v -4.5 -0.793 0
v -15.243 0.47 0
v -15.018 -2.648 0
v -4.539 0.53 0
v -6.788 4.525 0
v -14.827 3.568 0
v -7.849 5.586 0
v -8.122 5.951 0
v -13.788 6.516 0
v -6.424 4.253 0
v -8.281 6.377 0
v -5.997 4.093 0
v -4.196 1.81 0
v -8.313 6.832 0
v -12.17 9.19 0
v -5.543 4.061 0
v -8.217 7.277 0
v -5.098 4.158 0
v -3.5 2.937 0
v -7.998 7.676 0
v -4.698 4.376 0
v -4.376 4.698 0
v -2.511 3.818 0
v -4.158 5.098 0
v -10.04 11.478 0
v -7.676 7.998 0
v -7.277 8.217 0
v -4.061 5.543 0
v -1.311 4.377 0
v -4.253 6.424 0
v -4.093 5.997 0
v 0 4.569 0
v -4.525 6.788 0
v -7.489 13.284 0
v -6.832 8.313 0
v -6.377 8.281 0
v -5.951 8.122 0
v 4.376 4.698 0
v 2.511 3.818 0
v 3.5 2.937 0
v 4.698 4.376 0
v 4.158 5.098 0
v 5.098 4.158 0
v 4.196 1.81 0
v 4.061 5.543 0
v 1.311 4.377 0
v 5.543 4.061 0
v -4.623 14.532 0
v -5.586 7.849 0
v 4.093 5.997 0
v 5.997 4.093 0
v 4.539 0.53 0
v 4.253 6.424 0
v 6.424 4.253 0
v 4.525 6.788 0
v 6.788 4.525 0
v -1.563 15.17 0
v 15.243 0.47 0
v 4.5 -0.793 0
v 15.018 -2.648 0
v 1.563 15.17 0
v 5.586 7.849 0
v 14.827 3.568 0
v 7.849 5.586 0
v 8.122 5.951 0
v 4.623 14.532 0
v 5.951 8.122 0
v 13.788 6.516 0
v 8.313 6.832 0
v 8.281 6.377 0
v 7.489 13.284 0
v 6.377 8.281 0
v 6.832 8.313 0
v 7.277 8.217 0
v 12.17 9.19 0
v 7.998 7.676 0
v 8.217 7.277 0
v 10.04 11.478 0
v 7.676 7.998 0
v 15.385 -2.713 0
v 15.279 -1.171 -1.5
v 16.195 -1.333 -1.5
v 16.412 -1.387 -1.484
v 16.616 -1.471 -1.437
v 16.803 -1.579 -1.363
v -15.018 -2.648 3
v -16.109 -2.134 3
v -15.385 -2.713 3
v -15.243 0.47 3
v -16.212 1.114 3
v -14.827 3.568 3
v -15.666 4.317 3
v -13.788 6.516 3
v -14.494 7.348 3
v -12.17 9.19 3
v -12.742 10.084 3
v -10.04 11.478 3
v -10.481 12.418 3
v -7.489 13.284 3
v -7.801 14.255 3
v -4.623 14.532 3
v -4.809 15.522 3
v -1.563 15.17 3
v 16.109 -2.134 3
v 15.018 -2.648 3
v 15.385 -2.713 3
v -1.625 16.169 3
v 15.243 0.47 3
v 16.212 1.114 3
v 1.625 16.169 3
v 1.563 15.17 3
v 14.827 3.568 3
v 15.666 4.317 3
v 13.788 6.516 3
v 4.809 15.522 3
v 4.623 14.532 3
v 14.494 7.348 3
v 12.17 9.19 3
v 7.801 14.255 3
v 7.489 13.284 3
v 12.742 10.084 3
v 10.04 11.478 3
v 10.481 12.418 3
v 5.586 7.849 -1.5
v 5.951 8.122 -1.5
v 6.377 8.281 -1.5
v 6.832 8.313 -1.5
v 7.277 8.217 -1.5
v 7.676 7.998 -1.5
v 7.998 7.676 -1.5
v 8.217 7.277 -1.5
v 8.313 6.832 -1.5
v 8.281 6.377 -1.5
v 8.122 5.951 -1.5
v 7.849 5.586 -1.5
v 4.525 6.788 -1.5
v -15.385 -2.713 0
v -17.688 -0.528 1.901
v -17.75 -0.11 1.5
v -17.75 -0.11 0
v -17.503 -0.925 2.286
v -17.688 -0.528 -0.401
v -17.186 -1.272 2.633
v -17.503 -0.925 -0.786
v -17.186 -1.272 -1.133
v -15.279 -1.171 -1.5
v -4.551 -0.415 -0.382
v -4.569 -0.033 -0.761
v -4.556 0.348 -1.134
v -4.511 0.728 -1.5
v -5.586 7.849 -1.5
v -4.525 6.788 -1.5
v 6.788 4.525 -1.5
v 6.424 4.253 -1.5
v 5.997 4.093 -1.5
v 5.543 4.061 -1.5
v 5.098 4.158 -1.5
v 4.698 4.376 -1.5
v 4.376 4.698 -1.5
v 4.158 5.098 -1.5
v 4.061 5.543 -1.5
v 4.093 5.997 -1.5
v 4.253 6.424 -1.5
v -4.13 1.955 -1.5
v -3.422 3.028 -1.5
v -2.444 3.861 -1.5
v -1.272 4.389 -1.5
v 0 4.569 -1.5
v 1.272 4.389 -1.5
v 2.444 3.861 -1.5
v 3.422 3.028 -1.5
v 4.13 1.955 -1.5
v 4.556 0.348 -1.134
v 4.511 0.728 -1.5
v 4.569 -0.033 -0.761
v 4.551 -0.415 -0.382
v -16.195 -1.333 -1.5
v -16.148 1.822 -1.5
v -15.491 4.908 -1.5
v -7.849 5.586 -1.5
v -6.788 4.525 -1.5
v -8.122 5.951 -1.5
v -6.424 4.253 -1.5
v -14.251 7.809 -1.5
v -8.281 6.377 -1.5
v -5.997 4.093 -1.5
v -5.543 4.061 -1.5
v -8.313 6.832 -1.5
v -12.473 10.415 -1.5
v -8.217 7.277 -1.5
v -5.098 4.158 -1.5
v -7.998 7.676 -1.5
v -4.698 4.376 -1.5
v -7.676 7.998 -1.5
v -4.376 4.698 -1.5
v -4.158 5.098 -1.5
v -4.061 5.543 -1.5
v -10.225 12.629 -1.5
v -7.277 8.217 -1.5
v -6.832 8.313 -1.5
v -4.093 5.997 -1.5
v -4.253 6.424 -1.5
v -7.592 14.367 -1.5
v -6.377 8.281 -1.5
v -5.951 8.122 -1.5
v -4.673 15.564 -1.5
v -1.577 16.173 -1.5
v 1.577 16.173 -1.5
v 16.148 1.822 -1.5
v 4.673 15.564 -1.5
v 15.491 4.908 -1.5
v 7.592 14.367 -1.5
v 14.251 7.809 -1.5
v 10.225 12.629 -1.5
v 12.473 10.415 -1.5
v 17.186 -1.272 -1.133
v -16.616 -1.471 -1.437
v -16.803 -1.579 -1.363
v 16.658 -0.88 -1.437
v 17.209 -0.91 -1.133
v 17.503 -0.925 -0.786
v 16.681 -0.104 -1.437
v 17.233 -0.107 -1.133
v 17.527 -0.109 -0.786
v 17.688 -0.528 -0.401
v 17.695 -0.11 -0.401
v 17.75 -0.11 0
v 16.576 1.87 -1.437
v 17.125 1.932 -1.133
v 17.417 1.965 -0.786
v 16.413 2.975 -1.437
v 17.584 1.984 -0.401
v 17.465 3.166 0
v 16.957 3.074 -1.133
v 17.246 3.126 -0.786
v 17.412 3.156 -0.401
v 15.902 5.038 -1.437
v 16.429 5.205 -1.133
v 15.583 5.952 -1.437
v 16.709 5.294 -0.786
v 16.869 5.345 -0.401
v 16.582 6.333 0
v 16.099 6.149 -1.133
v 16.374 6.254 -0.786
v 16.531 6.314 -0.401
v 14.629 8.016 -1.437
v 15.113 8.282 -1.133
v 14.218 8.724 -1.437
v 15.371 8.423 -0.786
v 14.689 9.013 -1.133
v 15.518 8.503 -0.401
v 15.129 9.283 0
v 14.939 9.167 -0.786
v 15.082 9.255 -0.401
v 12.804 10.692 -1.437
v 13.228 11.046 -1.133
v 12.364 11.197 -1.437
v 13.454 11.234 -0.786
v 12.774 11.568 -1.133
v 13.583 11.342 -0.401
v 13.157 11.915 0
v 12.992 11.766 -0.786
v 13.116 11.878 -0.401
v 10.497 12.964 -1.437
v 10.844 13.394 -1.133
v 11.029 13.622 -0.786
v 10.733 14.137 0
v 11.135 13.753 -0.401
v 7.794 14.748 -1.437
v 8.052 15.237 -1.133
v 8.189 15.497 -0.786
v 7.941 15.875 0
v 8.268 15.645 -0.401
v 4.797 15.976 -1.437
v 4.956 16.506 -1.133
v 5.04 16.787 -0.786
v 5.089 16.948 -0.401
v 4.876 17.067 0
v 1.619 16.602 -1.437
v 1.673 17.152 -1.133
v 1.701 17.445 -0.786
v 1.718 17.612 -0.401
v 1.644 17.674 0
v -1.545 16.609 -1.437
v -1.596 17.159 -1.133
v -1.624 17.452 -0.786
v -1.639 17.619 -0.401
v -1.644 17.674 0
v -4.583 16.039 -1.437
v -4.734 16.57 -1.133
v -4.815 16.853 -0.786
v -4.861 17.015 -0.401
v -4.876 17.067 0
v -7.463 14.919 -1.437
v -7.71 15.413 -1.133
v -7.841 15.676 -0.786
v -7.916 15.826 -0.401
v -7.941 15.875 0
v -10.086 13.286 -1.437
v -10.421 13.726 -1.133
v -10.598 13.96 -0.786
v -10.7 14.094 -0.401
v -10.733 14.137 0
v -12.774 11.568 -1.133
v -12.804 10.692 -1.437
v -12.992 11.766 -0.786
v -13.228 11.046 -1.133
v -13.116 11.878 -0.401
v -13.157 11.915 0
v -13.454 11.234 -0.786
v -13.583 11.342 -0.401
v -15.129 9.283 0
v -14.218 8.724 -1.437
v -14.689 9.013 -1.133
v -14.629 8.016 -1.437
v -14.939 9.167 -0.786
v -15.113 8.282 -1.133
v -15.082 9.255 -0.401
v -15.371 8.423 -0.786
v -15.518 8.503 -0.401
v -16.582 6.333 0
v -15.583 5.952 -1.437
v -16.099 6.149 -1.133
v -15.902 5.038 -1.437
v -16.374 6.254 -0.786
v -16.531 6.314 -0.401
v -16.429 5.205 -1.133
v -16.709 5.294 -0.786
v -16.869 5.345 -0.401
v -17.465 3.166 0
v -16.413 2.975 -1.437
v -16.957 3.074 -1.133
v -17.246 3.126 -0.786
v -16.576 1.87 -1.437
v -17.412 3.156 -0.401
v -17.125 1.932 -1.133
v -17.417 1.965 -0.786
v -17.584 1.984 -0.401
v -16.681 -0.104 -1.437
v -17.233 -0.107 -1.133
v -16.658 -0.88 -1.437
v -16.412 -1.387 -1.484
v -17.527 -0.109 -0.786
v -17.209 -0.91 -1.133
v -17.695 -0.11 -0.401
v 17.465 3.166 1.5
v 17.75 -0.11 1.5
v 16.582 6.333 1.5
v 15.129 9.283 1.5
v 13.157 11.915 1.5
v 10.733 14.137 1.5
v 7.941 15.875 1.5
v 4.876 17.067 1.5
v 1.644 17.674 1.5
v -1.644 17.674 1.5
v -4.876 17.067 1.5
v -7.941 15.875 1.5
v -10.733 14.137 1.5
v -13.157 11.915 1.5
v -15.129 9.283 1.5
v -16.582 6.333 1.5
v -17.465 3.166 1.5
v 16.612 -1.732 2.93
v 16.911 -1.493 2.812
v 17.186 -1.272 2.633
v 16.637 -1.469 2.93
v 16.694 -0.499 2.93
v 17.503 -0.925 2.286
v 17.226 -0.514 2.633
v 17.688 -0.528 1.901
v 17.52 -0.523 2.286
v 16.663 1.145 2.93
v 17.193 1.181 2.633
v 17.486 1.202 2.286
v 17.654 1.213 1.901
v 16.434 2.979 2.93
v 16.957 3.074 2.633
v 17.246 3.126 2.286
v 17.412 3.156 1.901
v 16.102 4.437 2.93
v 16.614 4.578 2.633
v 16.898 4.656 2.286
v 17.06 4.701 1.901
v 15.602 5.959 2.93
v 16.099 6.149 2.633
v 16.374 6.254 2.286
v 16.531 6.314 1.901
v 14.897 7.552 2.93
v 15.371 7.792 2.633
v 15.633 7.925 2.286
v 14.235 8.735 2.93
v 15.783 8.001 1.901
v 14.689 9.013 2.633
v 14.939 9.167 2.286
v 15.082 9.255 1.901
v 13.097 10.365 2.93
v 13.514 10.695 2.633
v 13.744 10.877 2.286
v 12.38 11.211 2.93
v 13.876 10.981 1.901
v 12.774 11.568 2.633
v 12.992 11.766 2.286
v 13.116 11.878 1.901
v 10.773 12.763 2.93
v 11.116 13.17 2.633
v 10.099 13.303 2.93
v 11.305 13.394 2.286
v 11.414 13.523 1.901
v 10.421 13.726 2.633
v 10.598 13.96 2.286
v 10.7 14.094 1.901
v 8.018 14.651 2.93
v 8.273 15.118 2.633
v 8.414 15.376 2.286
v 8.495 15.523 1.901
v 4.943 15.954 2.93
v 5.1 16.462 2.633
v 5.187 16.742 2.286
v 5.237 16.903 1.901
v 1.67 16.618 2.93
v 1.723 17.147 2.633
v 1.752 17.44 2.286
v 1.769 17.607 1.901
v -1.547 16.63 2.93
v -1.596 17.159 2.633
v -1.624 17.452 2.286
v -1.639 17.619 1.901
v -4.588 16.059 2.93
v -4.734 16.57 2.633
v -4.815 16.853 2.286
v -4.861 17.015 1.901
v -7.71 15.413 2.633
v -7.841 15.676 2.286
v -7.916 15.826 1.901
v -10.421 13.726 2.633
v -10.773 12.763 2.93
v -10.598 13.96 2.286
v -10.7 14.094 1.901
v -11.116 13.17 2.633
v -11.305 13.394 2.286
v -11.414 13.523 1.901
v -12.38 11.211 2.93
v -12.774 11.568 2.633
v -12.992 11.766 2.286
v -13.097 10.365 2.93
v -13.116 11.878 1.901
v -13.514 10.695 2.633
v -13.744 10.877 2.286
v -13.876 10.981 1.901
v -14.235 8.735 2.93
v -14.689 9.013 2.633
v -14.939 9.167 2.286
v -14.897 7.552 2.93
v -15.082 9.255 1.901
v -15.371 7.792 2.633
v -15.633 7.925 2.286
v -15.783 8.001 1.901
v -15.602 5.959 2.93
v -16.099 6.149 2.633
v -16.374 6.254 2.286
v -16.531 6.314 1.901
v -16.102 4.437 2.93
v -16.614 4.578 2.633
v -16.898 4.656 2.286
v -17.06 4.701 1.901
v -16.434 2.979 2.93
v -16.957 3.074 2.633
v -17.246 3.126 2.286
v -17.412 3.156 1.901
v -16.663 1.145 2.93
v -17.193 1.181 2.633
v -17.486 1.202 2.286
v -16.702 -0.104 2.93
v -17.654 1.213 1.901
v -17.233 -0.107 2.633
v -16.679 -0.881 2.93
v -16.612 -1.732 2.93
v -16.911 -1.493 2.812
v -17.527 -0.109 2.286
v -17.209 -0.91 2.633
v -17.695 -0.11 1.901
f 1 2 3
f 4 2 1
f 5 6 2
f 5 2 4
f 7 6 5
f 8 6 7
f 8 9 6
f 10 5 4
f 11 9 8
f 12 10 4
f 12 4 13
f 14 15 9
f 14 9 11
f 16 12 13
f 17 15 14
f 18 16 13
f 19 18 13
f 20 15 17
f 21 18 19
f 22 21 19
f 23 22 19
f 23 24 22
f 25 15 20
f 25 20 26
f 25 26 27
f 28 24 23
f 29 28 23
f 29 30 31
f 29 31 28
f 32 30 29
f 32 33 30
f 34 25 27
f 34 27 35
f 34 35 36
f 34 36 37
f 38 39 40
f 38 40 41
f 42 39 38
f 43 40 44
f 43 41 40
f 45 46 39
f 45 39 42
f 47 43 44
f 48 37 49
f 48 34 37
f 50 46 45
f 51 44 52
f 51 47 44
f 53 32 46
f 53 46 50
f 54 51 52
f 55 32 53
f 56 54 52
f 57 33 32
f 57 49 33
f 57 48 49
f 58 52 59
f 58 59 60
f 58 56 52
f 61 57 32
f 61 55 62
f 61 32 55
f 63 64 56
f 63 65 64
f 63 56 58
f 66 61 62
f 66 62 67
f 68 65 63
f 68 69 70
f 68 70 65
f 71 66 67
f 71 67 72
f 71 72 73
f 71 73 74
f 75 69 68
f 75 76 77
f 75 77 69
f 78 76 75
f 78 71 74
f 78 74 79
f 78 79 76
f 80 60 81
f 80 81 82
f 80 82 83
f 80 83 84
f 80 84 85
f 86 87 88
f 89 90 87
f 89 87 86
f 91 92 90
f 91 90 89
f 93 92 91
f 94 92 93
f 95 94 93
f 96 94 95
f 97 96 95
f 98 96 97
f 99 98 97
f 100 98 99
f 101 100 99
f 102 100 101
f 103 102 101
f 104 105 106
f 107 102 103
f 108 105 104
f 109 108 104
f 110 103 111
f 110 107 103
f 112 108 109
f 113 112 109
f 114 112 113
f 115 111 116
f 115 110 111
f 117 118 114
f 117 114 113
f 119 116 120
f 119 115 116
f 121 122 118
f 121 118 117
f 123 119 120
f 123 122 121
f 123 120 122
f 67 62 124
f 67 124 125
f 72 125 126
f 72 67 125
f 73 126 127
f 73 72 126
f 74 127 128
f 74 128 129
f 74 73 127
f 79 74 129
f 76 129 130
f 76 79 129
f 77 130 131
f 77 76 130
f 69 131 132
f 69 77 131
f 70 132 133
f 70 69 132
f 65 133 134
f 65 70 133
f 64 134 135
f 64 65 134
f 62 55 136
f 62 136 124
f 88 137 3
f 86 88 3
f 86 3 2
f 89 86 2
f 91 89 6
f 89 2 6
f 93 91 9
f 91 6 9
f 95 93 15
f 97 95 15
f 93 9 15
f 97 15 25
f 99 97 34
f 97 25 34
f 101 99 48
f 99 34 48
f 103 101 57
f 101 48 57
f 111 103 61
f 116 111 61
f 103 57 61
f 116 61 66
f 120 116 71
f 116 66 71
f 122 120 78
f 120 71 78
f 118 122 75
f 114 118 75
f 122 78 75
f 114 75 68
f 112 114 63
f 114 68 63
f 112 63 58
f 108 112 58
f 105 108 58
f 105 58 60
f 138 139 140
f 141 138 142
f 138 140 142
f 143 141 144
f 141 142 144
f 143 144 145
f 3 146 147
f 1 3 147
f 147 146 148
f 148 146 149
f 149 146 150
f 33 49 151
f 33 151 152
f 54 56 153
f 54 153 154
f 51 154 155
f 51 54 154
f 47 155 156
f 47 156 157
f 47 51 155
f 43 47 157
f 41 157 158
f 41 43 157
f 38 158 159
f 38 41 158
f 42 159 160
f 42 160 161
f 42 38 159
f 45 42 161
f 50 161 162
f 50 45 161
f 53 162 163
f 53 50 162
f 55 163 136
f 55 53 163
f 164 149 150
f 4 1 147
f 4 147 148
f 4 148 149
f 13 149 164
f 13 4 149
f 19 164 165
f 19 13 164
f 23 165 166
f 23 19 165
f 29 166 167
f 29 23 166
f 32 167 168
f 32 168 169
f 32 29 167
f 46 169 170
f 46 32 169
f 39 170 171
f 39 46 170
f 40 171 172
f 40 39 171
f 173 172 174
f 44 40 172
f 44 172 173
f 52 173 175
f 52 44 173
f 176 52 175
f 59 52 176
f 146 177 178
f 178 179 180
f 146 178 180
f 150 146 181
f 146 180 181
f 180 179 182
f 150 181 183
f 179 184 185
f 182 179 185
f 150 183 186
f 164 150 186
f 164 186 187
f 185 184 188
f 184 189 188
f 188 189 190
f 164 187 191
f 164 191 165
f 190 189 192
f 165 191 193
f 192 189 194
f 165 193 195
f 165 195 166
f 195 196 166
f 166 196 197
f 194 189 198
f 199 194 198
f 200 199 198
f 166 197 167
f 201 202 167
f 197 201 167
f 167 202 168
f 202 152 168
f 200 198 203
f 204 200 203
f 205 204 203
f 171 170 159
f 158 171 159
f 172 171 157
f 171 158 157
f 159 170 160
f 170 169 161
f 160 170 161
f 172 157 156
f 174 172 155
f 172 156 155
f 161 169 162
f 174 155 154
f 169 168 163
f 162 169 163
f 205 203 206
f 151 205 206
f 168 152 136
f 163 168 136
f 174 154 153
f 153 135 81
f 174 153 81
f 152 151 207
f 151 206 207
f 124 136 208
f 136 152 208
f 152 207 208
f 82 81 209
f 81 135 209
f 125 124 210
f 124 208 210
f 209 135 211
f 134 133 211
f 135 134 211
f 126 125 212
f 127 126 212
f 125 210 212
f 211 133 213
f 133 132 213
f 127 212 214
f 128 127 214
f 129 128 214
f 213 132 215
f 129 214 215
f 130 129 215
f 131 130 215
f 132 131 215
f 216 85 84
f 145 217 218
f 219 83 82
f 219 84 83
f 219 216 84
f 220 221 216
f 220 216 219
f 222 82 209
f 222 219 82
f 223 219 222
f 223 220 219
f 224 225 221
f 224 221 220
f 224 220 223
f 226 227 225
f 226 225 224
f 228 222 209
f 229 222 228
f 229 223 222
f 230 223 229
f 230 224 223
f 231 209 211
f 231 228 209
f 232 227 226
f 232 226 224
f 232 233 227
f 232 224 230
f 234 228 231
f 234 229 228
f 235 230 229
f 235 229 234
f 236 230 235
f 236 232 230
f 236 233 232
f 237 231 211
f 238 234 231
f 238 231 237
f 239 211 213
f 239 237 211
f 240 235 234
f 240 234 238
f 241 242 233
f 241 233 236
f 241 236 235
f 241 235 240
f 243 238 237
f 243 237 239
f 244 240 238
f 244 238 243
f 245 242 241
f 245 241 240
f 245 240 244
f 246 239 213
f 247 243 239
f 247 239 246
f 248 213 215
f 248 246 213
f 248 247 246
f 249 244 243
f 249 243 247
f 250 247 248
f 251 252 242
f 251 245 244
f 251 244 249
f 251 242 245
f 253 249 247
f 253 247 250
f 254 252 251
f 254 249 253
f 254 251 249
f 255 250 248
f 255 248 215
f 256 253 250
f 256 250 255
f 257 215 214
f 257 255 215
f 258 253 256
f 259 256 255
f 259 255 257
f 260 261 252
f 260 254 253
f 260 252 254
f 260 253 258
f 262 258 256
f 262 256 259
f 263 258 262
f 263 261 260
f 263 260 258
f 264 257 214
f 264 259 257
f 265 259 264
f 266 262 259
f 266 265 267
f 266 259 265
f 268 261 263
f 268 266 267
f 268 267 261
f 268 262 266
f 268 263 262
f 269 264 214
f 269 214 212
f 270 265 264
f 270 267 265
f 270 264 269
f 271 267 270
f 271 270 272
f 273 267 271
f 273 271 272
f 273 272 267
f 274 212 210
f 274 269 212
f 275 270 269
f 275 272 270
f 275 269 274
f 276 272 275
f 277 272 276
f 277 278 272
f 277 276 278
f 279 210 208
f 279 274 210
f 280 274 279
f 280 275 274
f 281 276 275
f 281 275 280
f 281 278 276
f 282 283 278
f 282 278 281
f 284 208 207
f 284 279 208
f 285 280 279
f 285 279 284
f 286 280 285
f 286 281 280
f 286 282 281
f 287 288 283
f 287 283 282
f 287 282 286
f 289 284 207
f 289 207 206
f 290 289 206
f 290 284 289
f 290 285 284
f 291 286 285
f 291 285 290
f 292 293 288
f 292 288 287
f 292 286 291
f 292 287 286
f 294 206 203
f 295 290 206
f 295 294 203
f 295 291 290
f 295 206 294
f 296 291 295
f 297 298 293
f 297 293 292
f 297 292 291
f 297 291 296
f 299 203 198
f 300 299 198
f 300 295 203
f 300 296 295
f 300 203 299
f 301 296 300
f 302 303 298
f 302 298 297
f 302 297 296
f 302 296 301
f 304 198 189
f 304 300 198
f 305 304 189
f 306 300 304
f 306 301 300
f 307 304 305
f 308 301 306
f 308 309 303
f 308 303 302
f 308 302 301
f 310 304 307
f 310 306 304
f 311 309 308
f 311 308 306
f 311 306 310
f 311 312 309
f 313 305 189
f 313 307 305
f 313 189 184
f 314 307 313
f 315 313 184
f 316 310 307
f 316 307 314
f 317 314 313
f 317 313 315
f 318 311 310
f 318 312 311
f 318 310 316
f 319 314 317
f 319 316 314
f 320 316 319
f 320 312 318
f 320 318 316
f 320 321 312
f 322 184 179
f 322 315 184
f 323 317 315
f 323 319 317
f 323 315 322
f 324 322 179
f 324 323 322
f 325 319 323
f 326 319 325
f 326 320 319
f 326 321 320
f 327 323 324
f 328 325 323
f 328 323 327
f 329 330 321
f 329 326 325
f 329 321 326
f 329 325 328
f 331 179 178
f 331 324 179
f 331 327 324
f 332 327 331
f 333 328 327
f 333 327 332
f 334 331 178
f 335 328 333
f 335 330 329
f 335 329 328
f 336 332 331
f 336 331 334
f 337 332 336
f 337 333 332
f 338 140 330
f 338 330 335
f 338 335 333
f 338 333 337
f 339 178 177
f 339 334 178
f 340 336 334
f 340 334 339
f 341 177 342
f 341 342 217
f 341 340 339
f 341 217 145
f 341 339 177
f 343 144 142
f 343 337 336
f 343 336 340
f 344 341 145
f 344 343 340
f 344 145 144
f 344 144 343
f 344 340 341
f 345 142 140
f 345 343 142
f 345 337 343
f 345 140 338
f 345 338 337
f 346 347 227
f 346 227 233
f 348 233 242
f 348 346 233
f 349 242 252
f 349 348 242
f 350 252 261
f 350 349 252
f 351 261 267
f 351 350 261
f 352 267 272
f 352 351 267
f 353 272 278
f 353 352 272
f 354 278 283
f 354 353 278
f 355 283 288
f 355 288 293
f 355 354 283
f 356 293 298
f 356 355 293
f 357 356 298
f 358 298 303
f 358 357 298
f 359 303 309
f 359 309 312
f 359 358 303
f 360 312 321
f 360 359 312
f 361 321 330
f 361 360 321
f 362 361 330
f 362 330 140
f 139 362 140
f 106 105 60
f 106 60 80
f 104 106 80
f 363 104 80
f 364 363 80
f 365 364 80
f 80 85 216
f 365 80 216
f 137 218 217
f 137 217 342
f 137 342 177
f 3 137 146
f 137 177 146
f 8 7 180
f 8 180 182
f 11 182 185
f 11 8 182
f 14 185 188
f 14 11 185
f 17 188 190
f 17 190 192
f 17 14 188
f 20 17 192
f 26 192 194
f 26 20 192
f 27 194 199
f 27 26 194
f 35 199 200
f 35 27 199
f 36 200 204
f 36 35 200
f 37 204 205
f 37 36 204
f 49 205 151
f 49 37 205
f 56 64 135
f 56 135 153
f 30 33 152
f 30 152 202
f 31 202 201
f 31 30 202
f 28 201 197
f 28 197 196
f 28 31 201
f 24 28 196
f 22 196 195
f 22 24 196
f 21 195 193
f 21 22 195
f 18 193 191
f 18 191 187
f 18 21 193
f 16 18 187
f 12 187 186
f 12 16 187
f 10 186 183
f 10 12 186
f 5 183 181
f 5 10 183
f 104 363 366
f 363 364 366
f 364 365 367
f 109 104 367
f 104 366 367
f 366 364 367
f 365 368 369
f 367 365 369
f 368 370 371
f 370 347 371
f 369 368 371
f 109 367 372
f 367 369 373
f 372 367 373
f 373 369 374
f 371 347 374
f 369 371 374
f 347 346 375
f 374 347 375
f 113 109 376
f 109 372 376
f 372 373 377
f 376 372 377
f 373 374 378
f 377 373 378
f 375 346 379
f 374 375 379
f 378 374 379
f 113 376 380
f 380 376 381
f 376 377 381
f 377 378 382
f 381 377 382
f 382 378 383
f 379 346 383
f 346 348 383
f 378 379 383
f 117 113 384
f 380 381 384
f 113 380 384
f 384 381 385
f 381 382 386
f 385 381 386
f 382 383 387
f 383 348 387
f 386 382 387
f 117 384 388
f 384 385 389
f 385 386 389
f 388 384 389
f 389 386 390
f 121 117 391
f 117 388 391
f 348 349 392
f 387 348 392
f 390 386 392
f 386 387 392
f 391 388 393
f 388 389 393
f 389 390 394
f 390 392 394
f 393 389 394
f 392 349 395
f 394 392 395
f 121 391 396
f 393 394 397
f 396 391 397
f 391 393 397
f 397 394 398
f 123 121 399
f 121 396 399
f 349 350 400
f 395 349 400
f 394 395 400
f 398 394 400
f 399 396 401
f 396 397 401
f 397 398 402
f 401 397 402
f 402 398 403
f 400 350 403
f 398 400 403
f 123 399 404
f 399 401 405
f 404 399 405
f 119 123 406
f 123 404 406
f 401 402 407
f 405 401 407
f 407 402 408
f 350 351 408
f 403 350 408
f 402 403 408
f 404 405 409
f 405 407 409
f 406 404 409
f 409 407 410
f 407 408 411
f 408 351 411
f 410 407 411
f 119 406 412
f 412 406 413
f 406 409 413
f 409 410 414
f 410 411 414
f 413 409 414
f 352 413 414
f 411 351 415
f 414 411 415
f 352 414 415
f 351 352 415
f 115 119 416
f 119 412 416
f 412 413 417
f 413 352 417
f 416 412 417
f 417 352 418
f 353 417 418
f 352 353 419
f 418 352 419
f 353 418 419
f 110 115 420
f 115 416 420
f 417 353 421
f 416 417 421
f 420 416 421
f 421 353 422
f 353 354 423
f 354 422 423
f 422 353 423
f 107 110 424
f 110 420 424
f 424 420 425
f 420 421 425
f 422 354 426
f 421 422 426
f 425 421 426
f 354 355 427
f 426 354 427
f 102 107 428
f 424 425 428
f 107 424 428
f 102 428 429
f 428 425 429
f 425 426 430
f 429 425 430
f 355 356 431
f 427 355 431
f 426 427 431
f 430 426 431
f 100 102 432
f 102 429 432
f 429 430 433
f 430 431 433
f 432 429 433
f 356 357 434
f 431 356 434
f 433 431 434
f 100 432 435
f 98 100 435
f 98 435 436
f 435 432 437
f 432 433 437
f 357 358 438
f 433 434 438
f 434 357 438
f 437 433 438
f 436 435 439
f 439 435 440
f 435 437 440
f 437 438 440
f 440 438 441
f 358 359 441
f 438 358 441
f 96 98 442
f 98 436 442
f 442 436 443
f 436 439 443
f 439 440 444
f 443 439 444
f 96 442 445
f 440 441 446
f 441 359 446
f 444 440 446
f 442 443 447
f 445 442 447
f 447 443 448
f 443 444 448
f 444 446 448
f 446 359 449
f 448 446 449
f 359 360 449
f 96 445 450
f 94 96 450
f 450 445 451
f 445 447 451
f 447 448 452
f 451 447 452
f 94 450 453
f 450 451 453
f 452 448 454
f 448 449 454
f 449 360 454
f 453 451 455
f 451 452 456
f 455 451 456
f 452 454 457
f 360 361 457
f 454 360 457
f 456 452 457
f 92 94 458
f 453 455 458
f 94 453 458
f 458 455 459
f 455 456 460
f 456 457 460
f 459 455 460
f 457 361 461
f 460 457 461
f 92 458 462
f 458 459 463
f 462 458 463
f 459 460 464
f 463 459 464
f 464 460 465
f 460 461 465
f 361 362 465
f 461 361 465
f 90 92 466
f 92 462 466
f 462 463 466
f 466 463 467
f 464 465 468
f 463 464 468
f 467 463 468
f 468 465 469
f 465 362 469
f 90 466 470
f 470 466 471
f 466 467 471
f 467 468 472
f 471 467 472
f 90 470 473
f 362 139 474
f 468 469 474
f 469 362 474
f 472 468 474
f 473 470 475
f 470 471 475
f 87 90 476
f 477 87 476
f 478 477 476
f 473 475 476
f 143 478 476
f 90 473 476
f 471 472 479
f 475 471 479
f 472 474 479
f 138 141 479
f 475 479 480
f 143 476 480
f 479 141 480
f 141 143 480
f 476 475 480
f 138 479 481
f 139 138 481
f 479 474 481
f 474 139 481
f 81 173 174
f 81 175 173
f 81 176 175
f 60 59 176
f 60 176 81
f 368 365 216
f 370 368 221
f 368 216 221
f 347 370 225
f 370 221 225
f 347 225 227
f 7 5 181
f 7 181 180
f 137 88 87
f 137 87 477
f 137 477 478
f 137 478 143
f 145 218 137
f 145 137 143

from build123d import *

# Parameters (mm, degrees)
F1_DEPTH    = 3
F2_DEPTH    = 1.5
F3_T1_DEPTH = 16.0790165437
F4_SIZE     = 1.49999
F5_T1_DEPTH = 8.1382032795
F5_T4_ANGLE = 209.6600935854
F5_T6_ANGLE = 209.6600935854


# Not quite as in the source:
# - a fillet or chamfer that OpenCascade refuses, or shapes differently, is made with other operations: its cross-section is extruded or revolved along the edge and cut away or added
# - a fillet or chamfer is up to 0.001 mm smaller than in the source, because OpenCascade refuses the exact size


with BuildPart() as f1:
    # F0 (on Top) → F1 (new body)
    with BuildSketch(Plane.XY):
        with BuildLine():
            Line((-17.480337616, -3.0822551536), (-15.0183182334, -2.6481347094))
            ThreePointArc((-15.0183182334, -2.6481347094), (0, 15.25), (15.0183182334, -2.6481347094))
            Line((15.0183182334, -2.6481347094), (17.480337616, -3.0822551536))
            ThreePointArc((17.480337616, -3.0822551536), (0, 17.75), (-17.480337616, -3.0822551536))
        make_face()
    extrude(amount=F1_DEPTH)

    # F0 (on Top) → F2 (join)
    with BuildSketch(Plane.XY):
        with BuildLine():
            Line((-17.480337616, -3.0822551536), (-15.0183182334, -2.6481347094))
            ThreePointArc((-15.0183182334, -2.6481347094), (0, 15.25), (15.0183182334, -2.6481347094))
            Line((15.0183182334, -2.6481347094), (17.480337616, -3.0822551536))
            ThreePointArc((17.480337616, -3.0822551536), (0, 17.75), (-17.480337616, -3.0822551536))
        make_face()
        with BuildLine():
            Line((-15.0183182334, -2.6481347094), (-4.5, -0.7934714132))
            ThreePointArc((-4.5, -0.7934714132), (0, 4.5694197535), (4.5, -0.7934714132))
            Line((4.5, -0.7934714132), (15.0183182334, -2.6481347094))
            ThreePointArc((15.0183182334, -2.6481347094), (0, 15.25), (-15.0183182334, -2.6481347094))
        make_face()
        with BuildLine():
            Line((-5.5861435714, 7.8488852712), (-4.5254833996, 6.7882250994))
            ThreePointArc((-4.5254833996, 6.7882250994), (-4.5254833996, 4.5254833996), (-6.7882250994, 4.5254833996))
            Line((-6.7882250994, 4.5254833996), (-7.8488852712, 5.5861435714))
            ThreePointArc((-7.8488852712, 5.5861435714), (-7.8488852712, 7.8488852712), (-5.5861435714, 7.8488852712))
        make_face(mode=Mode.SUBTRACT)
        with BuildLine():
            ThreePointArc((6.7882250994, 4.5254833996), (4.5254833996, 4.5254833996), (4.5254833996, 6.7882250994))
            Line((4.5254833996, 6.7882250994), (5.5861435714, 7.8488852712))
            ThreePointArc((5.5861435714, 7.8488852712), (7.8488852712, 7.8488852712), (7.8488852712, 5.5861435714))
            Line((7.8488852712, 5.5861435714), (6.7882250994, 4.5254833996))
        make_face(mode=Mode.SUBTRACT)
    extrude(amount=-F2_DEPTH)

    # F3: chamfer of 2 on 2 edges, made by hand

    # F3_s2 → F3_t1 (cut)
    with BuildSketch(Plane.XY.offset(-7.2895082718)):
        with BuildLine():
            Line((-15.3851589244, -2.7128186209), (-17.7302273788, -0.8375781136))
            ThreePointArc((-17.7302273788, -0.8375781136), (-17.6441291813, -1.935769985), (-17.480337616, -3.0822551536))
            Line((-17.480337616, -3.0822551536), (-15.3851589244, -2.7128186209))
        make_face()
        with BuildLine():
            Line((15.3851589244, -2.7128186209), (17.7302273788, -0.8375781136))
            ThreePointArc((17.7302273788, -0.8375781136), (17.6441291813, -1.935769985), (17.480337616, -3.0822551536))
            Line((17.480337616, -3.0822551536), (15.3851589244, -2.7128186209))
        make_face()
    extrude(amount=F3_T1_DEPTH, mode=Mode.SUBTRACT)

    # F4 (size 1.5 in the source; OpenCascade refuses exactly that, so slightly less here)
    f4_edges = [f1.edges().sort_by_distance(p)[0] for p in [
        (9.942579, -1.753145, -1.5),
        (-9.942579, -1.753145, -1.5),
    ]]
    chamfer(f4_edges, length=F4_SIZE)

    # F5: fillet of radius 1.5 on 4 edges, made by hand

    # F5_s2 → F5_t1 (cut)
    with BuildSketch(Plane.XY.offset(-3.3191016398)):
        with BuildLine():
            ThreePointArc((-17.7496579301, -0.1101969358), (-17.5995489023, -0.7550040841), (-17.1864813575, -1.2723861308))
            Line((-17.1864813575, -1.2723861308), (-17.7302273788, -0.8375781136))
            ThreePointArc((-17.7302273788, -0.8375781136), (-17.7436703144, -0.4739871018), (-17.7496579301, -0.1101969358))
        make_face()
        with BuildLine():
            ThreePointArc((17.1864813575, -1.2723861308), (17.5995489023, -0.7550040841), (17.7496579301, -0.1101969358))
            ThreePointArc((17.7496579301, -0.1101969358), (17.7436703144, -0.4739871018), (17.7302273788, -0.8375781136))
            Line((17.7302273788, -0.8375781136), (17.1864813575, -1.2723861308))
        make_face()
    extrude(amount=F5_T1_DEPTH, mode=Mode.SUBTRACT)

    # F5_s3 → F5_t4 (revolve, cut)
    with BuildSketch(Plane(origin=(0, 0, 0), x_dir=(0, 0, 1), z_dir=(-0.2559527399, -0.966689296, 0))):
        with BuildLine():
            ThreePointArc((3, -16.25), (2.5606601718, -17.3106601718), (1.5, -17.75))
            Line((1.5, -17.75), (3, -17.75))
            Line((3, -17.75), (3, -16.25))
        make_face()
    revolve(axis=Axis((0, 0, 3), (0, 0, 1)), revolution_arc=F5_T4_ANGLE, mode=Mode.SUBTRACT)

    # F5_s5 → F5_t6 (revolve, cut)
    with BuildSketch(Plane(origin=(0, 0, 0), x_dir=(0, 0, 1), z_dir=(-0.2559527399, -0.966689296, 0))):
        with BuildLine():
            ThreePointArc((-1.5, -16.25), (-1.0606601718, -17.3106601718), (0, -17.75))
            Line((0, -17.75), (-1.5, -17.75))
            Line((-1.5, -17.75), (-1.5, -16.25))
        make_face()
    revolve(axis=Axis((0, 0, -1.5), (0, 0, 1)), revolution_arc=F5_T6_ANGLE, mode=Mode.SUBTRACT)


solid = f1.part
